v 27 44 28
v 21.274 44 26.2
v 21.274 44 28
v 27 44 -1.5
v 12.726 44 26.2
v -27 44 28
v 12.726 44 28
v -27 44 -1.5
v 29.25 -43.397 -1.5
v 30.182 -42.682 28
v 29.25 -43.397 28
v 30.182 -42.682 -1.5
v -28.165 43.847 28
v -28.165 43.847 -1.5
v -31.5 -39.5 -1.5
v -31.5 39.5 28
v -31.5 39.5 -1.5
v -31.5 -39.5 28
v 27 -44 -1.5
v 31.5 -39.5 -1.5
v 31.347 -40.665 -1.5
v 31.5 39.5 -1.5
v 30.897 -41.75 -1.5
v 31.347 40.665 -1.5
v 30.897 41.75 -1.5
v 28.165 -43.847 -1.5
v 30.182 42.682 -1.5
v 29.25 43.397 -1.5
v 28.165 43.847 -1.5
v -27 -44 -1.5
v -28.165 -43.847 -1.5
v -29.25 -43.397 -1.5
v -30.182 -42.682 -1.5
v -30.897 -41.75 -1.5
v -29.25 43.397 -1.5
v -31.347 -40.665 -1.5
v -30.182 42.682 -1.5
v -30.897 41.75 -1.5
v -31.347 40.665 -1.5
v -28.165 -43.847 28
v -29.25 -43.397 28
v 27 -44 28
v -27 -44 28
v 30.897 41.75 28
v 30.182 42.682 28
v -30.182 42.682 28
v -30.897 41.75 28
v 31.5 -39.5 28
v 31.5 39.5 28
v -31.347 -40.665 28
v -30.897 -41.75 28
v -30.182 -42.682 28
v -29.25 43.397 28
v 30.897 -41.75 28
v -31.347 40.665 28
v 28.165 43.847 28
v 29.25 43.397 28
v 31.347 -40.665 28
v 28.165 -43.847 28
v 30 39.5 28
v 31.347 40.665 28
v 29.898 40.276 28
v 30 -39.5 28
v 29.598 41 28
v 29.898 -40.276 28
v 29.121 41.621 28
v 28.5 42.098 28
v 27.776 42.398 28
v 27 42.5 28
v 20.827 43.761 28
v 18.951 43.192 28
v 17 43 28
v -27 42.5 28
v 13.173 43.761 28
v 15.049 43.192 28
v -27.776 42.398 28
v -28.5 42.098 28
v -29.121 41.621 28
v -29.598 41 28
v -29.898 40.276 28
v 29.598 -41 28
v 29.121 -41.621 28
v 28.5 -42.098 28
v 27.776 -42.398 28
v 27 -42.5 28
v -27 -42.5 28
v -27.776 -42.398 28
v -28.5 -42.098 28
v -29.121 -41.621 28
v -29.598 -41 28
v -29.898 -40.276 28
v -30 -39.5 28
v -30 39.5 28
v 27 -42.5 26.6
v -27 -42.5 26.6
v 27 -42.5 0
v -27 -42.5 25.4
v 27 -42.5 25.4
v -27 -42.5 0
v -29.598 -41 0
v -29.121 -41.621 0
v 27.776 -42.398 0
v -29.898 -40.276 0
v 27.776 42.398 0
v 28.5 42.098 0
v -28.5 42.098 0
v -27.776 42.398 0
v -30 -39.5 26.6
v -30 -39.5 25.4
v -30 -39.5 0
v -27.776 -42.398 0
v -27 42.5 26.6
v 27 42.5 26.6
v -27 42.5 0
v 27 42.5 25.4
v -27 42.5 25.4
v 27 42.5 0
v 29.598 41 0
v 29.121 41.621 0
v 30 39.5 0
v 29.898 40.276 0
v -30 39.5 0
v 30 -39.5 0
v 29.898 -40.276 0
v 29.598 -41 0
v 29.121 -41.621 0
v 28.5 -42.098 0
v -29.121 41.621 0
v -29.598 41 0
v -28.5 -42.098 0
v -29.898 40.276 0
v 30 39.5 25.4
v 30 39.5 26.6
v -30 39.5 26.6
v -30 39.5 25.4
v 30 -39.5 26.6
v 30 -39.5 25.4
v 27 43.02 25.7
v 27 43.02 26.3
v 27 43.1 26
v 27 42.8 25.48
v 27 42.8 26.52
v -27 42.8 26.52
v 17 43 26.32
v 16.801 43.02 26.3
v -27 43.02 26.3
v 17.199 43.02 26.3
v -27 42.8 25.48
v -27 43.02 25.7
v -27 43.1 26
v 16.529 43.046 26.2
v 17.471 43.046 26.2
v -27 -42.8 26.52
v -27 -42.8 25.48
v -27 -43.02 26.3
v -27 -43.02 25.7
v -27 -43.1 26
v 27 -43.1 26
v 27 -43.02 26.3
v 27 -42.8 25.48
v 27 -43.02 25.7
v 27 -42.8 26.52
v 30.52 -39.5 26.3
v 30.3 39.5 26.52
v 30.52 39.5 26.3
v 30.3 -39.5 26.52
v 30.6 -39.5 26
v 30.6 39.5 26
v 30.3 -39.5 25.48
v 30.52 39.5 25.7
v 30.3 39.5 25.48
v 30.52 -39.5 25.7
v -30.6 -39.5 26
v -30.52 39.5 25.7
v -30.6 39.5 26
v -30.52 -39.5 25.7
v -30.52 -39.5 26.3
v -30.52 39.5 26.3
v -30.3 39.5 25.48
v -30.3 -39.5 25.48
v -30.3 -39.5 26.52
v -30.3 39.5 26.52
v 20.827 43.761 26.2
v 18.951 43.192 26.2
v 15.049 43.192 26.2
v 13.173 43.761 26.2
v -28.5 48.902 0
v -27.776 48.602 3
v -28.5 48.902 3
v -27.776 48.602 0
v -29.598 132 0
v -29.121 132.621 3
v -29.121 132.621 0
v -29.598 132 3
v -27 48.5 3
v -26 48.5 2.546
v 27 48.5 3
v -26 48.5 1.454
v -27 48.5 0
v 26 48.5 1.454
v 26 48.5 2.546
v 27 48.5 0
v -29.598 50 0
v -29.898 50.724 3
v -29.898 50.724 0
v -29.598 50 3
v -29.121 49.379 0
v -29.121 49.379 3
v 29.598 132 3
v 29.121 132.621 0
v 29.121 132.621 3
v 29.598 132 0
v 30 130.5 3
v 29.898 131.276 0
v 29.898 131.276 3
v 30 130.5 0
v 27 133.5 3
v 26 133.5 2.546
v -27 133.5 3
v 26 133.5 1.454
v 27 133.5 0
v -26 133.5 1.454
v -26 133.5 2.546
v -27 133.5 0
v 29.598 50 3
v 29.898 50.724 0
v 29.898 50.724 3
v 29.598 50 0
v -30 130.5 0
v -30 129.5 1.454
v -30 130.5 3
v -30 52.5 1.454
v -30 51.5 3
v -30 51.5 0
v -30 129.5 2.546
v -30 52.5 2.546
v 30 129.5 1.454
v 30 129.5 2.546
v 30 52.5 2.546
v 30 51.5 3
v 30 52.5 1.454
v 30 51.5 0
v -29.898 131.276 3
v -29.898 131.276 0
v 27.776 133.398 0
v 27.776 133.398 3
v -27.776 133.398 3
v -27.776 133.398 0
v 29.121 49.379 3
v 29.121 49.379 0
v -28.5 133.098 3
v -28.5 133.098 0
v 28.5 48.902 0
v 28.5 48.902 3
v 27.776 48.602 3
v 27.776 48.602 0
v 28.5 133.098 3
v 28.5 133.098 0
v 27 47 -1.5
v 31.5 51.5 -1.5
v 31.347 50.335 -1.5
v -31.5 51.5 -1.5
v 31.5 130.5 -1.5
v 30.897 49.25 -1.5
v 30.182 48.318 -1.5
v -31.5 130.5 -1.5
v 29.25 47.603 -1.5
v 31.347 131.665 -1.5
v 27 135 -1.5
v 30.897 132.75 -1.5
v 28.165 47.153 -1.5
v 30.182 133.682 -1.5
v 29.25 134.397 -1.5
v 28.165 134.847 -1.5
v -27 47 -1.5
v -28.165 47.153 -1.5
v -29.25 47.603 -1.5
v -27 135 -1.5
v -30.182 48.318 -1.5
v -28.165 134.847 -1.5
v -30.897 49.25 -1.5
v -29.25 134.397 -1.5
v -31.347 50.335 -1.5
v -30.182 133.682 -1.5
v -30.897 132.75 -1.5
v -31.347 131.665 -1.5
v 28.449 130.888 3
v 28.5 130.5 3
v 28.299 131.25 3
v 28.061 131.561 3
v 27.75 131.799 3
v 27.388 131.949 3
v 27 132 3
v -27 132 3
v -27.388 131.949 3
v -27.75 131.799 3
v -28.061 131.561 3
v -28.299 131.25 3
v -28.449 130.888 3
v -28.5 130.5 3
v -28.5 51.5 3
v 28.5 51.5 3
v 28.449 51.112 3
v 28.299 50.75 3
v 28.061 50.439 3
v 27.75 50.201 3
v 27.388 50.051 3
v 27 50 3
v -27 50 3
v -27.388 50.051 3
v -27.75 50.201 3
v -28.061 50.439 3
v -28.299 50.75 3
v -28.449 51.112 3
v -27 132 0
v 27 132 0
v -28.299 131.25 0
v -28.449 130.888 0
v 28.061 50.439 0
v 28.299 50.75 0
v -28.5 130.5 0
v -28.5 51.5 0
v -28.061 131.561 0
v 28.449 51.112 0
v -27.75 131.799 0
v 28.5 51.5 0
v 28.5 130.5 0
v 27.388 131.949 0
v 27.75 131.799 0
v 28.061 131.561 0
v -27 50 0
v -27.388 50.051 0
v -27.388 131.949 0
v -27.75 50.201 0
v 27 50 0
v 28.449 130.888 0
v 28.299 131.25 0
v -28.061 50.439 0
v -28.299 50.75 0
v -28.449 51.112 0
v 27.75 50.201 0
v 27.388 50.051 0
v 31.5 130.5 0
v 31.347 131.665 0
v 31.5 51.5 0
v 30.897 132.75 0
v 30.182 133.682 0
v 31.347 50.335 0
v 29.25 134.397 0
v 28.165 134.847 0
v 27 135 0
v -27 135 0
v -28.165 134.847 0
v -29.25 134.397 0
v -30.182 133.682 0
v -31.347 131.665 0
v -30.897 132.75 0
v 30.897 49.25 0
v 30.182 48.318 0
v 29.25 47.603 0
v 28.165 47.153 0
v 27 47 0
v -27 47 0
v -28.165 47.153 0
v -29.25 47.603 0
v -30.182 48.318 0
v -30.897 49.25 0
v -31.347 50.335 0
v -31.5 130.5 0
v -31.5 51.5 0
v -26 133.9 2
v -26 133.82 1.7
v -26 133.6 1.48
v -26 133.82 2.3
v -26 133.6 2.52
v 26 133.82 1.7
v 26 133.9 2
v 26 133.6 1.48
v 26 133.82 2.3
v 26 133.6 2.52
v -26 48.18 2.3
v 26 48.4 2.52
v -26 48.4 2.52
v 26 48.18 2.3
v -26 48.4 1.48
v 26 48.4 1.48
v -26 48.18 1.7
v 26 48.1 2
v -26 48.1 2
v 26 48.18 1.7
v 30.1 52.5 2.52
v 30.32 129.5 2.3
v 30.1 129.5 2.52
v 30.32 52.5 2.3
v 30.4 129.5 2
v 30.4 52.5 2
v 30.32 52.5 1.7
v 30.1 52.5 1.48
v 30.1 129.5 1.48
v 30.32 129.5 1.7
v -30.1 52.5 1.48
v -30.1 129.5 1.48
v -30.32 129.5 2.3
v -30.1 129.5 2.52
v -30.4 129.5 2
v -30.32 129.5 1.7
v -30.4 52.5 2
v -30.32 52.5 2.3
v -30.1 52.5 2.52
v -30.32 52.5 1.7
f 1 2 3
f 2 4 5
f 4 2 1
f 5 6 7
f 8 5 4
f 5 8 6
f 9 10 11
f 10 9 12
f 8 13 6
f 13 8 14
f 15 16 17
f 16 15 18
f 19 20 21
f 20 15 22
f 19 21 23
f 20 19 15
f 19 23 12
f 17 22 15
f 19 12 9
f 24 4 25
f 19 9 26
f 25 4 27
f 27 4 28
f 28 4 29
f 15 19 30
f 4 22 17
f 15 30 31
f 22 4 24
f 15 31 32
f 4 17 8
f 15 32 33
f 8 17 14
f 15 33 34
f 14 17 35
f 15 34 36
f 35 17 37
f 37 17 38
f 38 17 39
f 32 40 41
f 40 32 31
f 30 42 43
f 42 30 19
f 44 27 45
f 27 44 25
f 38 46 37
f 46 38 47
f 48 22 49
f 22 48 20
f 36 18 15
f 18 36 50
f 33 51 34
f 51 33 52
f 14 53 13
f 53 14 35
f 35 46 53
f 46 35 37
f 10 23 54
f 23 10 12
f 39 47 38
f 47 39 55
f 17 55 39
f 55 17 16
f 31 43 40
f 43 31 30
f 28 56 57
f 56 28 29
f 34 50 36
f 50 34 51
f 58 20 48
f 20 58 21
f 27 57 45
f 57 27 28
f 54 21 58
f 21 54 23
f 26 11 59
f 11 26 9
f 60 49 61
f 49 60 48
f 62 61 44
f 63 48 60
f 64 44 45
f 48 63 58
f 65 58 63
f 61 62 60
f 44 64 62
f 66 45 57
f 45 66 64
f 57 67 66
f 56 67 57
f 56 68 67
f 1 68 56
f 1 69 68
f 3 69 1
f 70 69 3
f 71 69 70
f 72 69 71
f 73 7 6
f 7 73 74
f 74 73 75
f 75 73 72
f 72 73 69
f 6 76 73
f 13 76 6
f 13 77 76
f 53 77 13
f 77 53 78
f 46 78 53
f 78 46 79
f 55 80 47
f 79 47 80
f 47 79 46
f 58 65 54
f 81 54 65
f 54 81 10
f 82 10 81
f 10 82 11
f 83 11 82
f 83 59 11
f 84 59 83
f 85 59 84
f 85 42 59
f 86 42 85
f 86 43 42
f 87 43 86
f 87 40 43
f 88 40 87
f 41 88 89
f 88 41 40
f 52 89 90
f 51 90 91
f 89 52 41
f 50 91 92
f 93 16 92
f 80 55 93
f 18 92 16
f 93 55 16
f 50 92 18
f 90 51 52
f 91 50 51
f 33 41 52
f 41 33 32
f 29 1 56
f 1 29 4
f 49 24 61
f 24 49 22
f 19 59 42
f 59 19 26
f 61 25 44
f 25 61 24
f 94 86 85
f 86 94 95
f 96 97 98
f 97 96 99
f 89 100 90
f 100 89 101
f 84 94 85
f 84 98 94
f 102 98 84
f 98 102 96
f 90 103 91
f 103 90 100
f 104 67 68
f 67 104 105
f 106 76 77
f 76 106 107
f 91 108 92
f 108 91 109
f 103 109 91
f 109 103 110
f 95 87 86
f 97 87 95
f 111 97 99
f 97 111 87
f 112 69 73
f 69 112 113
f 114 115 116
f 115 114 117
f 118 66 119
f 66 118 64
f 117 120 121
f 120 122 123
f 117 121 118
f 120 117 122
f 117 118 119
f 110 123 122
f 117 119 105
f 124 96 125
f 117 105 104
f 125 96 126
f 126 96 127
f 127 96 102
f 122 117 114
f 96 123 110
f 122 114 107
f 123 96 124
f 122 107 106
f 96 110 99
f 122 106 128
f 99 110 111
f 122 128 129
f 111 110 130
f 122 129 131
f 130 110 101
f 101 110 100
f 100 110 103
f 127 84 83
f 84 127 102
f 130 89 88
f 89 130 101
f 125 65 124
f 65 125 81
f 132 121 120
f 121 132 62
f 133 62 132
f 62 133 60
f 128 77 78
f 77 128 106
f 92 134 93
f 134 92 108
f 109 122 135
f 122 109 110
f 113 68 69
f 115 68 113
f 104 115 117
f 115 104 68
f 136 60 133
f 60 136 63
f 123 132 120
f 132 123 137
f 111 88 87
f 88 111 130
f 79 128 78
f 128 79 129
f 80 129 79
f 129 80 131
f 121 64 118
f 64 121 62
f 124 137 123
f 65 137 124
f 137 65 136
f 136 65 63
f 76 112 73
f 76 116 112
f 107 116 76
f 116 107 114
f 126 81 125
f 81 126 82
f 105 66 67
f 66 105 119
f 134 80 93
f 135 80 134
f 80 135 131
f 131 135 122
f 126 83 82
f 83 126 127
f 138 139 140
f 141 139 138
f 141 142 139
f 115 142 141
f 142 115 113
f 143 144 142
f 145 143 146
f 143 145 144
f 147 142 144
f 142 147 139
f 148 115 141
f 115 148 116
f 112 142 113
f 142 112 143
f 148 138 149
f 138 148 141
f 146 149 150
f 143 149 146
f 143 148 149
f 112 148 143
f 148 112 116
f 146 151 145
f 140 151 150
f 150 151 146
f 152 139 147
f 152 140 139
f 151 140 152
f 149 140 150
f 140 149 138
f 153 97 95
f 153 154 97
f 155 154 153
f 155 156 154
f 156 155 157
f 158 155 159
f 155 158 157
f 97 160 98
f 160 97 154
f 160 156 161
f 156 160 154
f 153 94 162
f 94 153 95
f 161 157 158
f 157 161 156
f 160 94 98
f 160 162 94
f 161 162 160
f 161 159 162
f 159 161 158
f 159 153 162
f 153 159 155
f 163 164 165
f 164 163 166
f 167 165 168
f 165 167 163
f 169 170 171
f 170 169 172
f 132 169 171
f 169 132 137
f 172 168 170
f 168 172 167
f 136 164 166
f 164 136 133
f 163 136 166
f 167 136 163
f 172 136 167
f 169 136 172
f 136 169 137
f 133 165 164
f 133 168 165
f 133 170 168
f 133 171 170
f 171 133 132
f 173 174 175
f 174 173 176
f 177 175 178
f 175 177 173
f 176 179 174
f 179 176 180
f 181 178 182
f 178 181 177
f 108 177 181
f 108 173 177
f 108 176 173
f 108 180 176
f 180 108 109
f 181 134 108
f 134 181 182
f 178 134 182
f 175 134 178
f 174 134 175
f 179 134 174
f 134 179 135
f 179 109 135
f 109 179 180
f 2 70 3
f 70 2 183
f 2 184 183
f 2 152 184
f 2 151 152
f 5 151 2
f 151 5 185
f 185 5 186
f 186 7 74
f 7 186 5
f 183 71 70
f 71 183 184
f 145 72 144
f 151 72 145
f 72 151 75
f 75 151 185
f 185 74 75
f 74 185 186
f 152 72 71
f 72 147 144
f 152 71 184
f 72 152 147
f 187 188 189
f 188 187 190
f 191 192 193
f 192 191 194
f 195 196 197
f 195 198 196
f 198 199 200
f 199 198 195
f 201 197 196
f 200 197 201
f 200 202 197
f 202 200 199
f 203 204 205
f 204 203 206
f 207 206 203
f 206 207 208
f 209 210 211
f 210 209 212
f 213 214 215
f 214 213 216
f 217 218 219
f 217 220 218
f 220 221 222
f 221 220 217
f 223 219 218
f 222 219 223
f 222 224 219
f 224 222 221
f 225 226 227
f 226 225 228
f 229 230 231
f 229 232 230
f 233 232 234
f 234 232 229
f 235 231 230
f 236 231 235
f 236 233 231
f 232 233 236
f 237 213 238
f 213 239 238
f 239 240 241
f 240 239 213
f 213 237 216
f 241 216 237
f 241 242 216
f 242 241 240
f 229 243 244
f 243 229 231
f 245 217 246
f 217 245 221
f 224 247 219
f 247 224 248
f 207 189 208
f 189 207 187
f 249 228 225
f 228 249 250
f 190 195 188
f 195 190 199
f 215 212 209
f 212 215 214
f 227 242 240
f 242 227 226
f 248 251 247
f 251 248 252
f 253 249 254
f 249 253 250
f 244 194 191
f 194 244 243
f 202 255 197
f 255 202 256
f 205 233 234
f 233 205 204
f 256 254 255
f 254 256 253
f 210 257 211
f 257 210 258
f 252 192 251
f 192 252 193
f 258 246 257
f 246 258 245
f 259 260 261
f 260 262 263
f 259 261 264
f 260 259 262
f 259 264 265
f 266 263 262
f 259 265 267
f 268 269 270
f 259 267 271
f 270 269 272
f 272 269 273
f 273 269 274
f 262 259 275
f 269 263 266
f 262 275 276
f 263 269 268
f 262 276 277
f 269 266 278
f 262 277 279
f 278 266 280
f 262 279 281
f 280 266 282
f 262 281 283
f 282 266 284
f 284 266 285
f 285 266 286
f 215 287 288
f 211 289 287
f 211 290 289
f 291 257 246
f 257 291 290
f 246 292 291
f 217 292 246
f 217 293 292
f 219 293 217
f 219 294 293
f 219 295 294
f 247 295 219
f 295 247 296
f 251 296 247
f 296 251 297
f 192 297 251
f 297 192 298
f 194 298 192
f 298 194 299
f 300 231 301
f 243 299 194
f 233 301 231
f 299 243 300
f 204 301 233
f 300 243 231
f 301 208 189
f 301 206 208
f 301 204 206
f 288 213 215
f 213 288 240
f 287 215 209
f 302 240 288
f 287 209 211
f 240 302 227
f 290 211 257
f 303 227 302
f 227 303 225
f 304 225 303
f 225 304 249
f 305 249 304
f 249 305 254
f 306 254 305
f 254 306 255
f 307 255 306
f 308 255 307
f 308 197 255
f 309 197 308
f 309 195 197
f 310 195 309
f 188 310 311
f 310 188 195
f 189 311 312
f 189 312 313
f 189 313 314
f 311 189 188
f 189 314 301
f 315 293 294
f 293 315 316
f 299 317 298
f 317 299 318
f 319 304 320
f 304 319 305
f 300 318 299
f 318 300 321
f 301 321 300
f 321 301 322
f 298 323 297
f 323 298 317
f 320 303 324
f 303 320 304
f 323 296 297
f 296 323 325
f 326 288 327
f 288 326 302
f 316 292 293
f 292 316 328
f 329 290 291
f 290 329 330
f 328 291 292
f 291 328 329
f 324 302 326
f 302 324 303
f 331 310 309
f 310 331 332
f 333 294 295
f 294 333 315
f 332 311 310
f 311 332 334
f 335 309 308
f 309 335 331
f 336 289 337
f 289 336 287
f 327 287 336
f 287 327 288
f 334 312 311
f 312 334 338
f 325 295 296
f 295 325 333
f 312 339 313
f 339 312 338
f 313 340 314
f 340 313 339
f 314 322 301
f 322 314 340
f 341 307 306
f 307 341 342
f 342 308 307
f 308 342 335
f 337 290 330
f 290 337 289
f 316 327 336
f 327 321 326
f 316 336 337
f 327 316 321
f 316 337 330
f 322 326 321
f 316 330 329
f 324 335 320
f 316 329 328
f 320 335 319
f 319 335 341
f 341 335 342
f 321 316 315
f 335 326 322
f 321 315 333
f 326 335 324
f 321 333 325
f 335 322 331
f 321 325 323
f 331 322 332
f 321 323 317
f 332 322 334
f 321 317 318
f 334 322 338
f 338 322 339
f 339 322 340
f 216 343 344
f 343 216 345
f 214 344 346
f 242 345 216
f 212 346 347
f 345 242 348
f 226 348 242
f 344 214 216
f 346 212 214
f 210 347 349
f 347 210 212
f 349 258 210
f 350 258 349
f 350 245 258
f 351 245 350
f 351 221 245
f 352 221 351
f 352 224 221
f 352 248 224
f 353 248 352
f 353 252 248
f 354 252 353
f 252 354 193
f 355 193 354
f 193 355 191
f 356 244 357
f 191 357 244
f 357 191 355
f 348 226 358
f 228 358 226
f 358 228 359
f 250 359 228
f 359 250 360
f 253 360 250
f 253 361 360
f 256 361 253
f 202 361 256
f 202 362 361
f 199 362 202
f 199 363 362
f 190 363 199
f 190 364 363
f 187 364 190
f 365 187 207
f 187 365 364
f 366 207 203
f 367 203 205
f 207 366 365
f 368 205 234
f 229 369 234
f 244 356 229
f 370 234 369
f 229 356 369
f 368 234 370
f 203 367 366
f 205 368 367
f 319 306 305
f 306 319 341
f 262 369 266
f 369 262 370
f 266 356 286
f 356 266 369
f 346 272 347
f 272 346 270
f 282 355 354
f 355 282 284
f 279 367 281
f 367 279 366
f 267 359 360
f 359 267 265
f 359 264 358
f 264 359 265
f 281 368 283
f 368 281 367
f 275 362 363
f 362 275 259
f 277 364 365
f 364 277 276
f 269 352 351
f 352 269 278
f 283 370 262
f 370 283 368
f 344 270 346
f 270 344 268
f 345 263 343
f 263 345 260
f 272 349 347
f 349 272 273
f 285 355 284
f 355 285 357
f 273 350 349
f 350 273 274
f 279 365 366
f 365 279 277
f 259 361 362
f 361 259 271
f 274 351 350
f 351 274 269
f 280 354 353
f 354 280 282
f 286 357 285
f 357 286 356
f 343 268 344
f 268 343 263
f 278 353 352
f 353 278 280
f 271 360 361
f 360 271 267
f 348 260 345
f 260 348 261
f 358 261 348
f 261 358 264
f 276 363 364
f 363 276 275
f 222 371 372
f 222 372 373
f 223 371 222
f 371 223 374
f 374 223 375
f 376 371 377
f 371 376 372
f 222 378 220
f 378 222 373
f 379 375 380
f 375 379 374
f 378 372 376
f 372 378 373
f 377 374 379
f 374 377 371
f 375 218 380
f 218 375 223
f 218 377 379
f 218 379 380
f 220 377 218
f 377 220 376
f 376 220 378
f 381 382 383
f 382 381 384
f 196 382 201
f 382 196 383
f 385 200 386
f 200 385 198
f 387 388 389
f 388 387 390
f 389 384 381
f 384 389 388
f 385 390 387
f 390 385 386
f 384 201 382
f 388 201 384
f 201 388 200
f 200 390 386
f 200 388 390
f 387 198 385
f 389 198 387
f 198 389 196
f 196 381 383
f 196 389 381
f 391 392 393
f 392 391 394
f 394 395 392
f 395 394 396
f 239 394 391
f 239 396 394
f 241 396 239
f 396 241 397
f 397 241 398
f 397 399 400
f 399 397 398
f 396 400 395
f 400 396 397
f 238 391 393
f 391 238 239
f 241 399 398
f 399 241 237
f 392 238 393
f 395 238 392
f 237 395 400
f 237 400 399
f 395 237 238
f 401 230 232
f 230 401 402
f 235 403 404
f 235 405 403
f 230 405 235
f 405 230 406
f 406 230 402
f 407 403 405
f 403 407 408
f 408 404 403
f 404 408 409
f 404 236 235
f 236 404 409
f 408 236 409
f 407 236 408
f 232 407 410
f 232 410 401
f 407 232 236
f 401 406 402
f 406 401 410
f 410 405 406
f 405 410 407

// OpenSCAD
// V 1.2 Correction / hint from molotok3D, some minor fixes
// V 1.1- added opening helper and an optional separating wall

wi=60;	// inner width, length & heigth
li=85;
h=28;
th=1.5;	// wall thickness
r=3;	// radius of rounded corners
opening_help=true;	// make a gap to ease opening of the cover, f.ex.
		// with a coin - girls are afraid of their finger nails ;-)
separator=0;	// generate a separating wall inside - set to 0 for none

e=0.01;
ri=(r>th)?r-th:e;	// needed for the cover - needs to be larger than 0 for proper results
l=li-2*r;
w=wi-2*r;

module box(){
	difference(){
		translate([0,0,-th])hull(){
			for (i=[[-w/2,-l/2],[-w/2,l/2],[w/2,-l/2],[w/2,l/2]]){
				translate(i)cylinder(r=r+th,h=h+th,$fn=8*r);
			}
		}
		hull(){
			for (i=[[-w/2,-l/2],[-w/2,l/2,],[w/2,-l/2],[w/2,l/2]]){
				translate(i)cylinder(r=r,h=h,$fn=8*r);
			}
		}
		translate([-w/2,l/2+r,h-2])rotate([0,90,0])cylinder(d=1.2,h=w,$fn=12);
		translate([-w/2,-l/2-r,h-2])rotate([0,90,0])cylinder(d=1.2,h=w,$fn=12);
		translate([w/2+r,l/2,h-2])rotate([90,0,0])cylinder(d=1.2,h=l,$fn=12);
		translate([-w/2-r,l/2,h-2])rotate([90,0,0])cylinder(d=1.2,h=l,$fn=12);

		// if you need some adjustment for the opening helper size or position,
		// this is the right place
		if (opening_help)translate([w/2-10,l/2+13.5,h-1.8])cylinder(d=20,h=10,$fn=32);
	}
	if (separator>0){
		translate([separator-wi/2,-li/2-e,-e])difference(){
			cube([th,li+2*e,h]);
			translate([-e,-e,h-3])cube([th+2*e,2*th+2+2*e,5]);
			translate([-e,e+li-2*th-2,h-3])cube([th+2+2*e,2*th+2+2*e,5]);
		}
	}
}

module cover(){
	translate([0,0,-th])hull(){
		for (i=[[-w/2,-l/2],[-w/2,l/2],[w/2,-l/2],[w/2,l/2]]){
			translate(i)cylinder(r=r+th,h=th,$fn=8*r);
		}
	}
	difference(){
		translate([0,0,-th])hull(){
			for (i=[[-w/2,-l/2],[-w/2,l/2],[w/2,-l/2],[w/2,l/2]]){
				translate(i)cylinder(r=r,h=th+3,$fn=8*r);
			}
		}
		hull(){
			for (i=[[-w/2,-l/2],[-w/2,l/2],[w/2,-l/2],[w/2,l/2]]){
				if (r>th){
					translate(i)cylinder(r=r-th,h=3,$fn=8*r);
				}else{
					translate(i)cylinder(r=e,h=3,$fn=8*r);
				}
			}
		}
	}
	translate([-w/2+1,l/2+r-0.2,2])rotate([0,90,0])cylinder(d=1.2,h=w-2,$fn=12);
	translate([-w/2+1,-l/2-r+0.2,2])rotate([0,90,0])cylinder(d=1.2,h=w-2,$fn=12);
	translate([w/2+r-0.2,l/2-1,2])rotate([90,0,0])cylinder(d=1.2,h=l-2,$fn=12);
	translate([-w/2-r+0.2,l/2-1,2])rotate([90,0,0])cylinder(d=1.2,h=l-2,$fn=12);

}

box();
translate([0,li+3+2*th,0])
	cover();
